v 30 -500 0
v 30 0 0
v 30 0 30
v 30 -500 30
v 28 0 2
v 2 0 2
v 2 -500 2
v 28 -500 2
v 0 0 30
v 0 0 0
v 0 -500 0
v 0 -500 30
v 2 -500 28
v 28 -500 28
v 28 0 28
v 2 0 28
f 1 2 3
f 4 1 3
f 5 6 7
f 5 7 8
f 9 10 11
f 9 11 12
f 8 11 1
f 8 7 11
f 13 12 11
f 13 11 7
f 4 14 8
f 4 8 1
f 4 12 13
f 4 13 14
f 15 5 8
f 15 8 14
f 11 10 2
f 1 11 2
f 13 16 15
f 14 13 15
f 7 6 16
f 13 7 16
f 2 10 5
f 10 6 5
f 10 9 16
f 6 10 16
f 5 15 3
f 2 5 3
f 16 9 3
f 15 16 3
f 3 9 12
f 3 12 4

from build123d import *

# Parameters (mm, degrees)
SKETCH_W   = 30
SKETCH_H   = 30
SKETCH_W_2 = 26
SKETCH_H_2 = 26
PAD_DEPTH  = 500


with BuildPart() as part:
    # Sketch → Pad (new body)
    with BuildSketch(Plane.XZ):
        with Locations((15, 15)):
            Rectangle(SKETCH_W, SKETCH_H)
        with Locations((15, 15)):
            Rectangle(SKETCH_W_2, SKETCH_H_2, mode=Mode.SUBTRACT)
    extrude(amount=PAD_DEPTH)


solid = part.part
